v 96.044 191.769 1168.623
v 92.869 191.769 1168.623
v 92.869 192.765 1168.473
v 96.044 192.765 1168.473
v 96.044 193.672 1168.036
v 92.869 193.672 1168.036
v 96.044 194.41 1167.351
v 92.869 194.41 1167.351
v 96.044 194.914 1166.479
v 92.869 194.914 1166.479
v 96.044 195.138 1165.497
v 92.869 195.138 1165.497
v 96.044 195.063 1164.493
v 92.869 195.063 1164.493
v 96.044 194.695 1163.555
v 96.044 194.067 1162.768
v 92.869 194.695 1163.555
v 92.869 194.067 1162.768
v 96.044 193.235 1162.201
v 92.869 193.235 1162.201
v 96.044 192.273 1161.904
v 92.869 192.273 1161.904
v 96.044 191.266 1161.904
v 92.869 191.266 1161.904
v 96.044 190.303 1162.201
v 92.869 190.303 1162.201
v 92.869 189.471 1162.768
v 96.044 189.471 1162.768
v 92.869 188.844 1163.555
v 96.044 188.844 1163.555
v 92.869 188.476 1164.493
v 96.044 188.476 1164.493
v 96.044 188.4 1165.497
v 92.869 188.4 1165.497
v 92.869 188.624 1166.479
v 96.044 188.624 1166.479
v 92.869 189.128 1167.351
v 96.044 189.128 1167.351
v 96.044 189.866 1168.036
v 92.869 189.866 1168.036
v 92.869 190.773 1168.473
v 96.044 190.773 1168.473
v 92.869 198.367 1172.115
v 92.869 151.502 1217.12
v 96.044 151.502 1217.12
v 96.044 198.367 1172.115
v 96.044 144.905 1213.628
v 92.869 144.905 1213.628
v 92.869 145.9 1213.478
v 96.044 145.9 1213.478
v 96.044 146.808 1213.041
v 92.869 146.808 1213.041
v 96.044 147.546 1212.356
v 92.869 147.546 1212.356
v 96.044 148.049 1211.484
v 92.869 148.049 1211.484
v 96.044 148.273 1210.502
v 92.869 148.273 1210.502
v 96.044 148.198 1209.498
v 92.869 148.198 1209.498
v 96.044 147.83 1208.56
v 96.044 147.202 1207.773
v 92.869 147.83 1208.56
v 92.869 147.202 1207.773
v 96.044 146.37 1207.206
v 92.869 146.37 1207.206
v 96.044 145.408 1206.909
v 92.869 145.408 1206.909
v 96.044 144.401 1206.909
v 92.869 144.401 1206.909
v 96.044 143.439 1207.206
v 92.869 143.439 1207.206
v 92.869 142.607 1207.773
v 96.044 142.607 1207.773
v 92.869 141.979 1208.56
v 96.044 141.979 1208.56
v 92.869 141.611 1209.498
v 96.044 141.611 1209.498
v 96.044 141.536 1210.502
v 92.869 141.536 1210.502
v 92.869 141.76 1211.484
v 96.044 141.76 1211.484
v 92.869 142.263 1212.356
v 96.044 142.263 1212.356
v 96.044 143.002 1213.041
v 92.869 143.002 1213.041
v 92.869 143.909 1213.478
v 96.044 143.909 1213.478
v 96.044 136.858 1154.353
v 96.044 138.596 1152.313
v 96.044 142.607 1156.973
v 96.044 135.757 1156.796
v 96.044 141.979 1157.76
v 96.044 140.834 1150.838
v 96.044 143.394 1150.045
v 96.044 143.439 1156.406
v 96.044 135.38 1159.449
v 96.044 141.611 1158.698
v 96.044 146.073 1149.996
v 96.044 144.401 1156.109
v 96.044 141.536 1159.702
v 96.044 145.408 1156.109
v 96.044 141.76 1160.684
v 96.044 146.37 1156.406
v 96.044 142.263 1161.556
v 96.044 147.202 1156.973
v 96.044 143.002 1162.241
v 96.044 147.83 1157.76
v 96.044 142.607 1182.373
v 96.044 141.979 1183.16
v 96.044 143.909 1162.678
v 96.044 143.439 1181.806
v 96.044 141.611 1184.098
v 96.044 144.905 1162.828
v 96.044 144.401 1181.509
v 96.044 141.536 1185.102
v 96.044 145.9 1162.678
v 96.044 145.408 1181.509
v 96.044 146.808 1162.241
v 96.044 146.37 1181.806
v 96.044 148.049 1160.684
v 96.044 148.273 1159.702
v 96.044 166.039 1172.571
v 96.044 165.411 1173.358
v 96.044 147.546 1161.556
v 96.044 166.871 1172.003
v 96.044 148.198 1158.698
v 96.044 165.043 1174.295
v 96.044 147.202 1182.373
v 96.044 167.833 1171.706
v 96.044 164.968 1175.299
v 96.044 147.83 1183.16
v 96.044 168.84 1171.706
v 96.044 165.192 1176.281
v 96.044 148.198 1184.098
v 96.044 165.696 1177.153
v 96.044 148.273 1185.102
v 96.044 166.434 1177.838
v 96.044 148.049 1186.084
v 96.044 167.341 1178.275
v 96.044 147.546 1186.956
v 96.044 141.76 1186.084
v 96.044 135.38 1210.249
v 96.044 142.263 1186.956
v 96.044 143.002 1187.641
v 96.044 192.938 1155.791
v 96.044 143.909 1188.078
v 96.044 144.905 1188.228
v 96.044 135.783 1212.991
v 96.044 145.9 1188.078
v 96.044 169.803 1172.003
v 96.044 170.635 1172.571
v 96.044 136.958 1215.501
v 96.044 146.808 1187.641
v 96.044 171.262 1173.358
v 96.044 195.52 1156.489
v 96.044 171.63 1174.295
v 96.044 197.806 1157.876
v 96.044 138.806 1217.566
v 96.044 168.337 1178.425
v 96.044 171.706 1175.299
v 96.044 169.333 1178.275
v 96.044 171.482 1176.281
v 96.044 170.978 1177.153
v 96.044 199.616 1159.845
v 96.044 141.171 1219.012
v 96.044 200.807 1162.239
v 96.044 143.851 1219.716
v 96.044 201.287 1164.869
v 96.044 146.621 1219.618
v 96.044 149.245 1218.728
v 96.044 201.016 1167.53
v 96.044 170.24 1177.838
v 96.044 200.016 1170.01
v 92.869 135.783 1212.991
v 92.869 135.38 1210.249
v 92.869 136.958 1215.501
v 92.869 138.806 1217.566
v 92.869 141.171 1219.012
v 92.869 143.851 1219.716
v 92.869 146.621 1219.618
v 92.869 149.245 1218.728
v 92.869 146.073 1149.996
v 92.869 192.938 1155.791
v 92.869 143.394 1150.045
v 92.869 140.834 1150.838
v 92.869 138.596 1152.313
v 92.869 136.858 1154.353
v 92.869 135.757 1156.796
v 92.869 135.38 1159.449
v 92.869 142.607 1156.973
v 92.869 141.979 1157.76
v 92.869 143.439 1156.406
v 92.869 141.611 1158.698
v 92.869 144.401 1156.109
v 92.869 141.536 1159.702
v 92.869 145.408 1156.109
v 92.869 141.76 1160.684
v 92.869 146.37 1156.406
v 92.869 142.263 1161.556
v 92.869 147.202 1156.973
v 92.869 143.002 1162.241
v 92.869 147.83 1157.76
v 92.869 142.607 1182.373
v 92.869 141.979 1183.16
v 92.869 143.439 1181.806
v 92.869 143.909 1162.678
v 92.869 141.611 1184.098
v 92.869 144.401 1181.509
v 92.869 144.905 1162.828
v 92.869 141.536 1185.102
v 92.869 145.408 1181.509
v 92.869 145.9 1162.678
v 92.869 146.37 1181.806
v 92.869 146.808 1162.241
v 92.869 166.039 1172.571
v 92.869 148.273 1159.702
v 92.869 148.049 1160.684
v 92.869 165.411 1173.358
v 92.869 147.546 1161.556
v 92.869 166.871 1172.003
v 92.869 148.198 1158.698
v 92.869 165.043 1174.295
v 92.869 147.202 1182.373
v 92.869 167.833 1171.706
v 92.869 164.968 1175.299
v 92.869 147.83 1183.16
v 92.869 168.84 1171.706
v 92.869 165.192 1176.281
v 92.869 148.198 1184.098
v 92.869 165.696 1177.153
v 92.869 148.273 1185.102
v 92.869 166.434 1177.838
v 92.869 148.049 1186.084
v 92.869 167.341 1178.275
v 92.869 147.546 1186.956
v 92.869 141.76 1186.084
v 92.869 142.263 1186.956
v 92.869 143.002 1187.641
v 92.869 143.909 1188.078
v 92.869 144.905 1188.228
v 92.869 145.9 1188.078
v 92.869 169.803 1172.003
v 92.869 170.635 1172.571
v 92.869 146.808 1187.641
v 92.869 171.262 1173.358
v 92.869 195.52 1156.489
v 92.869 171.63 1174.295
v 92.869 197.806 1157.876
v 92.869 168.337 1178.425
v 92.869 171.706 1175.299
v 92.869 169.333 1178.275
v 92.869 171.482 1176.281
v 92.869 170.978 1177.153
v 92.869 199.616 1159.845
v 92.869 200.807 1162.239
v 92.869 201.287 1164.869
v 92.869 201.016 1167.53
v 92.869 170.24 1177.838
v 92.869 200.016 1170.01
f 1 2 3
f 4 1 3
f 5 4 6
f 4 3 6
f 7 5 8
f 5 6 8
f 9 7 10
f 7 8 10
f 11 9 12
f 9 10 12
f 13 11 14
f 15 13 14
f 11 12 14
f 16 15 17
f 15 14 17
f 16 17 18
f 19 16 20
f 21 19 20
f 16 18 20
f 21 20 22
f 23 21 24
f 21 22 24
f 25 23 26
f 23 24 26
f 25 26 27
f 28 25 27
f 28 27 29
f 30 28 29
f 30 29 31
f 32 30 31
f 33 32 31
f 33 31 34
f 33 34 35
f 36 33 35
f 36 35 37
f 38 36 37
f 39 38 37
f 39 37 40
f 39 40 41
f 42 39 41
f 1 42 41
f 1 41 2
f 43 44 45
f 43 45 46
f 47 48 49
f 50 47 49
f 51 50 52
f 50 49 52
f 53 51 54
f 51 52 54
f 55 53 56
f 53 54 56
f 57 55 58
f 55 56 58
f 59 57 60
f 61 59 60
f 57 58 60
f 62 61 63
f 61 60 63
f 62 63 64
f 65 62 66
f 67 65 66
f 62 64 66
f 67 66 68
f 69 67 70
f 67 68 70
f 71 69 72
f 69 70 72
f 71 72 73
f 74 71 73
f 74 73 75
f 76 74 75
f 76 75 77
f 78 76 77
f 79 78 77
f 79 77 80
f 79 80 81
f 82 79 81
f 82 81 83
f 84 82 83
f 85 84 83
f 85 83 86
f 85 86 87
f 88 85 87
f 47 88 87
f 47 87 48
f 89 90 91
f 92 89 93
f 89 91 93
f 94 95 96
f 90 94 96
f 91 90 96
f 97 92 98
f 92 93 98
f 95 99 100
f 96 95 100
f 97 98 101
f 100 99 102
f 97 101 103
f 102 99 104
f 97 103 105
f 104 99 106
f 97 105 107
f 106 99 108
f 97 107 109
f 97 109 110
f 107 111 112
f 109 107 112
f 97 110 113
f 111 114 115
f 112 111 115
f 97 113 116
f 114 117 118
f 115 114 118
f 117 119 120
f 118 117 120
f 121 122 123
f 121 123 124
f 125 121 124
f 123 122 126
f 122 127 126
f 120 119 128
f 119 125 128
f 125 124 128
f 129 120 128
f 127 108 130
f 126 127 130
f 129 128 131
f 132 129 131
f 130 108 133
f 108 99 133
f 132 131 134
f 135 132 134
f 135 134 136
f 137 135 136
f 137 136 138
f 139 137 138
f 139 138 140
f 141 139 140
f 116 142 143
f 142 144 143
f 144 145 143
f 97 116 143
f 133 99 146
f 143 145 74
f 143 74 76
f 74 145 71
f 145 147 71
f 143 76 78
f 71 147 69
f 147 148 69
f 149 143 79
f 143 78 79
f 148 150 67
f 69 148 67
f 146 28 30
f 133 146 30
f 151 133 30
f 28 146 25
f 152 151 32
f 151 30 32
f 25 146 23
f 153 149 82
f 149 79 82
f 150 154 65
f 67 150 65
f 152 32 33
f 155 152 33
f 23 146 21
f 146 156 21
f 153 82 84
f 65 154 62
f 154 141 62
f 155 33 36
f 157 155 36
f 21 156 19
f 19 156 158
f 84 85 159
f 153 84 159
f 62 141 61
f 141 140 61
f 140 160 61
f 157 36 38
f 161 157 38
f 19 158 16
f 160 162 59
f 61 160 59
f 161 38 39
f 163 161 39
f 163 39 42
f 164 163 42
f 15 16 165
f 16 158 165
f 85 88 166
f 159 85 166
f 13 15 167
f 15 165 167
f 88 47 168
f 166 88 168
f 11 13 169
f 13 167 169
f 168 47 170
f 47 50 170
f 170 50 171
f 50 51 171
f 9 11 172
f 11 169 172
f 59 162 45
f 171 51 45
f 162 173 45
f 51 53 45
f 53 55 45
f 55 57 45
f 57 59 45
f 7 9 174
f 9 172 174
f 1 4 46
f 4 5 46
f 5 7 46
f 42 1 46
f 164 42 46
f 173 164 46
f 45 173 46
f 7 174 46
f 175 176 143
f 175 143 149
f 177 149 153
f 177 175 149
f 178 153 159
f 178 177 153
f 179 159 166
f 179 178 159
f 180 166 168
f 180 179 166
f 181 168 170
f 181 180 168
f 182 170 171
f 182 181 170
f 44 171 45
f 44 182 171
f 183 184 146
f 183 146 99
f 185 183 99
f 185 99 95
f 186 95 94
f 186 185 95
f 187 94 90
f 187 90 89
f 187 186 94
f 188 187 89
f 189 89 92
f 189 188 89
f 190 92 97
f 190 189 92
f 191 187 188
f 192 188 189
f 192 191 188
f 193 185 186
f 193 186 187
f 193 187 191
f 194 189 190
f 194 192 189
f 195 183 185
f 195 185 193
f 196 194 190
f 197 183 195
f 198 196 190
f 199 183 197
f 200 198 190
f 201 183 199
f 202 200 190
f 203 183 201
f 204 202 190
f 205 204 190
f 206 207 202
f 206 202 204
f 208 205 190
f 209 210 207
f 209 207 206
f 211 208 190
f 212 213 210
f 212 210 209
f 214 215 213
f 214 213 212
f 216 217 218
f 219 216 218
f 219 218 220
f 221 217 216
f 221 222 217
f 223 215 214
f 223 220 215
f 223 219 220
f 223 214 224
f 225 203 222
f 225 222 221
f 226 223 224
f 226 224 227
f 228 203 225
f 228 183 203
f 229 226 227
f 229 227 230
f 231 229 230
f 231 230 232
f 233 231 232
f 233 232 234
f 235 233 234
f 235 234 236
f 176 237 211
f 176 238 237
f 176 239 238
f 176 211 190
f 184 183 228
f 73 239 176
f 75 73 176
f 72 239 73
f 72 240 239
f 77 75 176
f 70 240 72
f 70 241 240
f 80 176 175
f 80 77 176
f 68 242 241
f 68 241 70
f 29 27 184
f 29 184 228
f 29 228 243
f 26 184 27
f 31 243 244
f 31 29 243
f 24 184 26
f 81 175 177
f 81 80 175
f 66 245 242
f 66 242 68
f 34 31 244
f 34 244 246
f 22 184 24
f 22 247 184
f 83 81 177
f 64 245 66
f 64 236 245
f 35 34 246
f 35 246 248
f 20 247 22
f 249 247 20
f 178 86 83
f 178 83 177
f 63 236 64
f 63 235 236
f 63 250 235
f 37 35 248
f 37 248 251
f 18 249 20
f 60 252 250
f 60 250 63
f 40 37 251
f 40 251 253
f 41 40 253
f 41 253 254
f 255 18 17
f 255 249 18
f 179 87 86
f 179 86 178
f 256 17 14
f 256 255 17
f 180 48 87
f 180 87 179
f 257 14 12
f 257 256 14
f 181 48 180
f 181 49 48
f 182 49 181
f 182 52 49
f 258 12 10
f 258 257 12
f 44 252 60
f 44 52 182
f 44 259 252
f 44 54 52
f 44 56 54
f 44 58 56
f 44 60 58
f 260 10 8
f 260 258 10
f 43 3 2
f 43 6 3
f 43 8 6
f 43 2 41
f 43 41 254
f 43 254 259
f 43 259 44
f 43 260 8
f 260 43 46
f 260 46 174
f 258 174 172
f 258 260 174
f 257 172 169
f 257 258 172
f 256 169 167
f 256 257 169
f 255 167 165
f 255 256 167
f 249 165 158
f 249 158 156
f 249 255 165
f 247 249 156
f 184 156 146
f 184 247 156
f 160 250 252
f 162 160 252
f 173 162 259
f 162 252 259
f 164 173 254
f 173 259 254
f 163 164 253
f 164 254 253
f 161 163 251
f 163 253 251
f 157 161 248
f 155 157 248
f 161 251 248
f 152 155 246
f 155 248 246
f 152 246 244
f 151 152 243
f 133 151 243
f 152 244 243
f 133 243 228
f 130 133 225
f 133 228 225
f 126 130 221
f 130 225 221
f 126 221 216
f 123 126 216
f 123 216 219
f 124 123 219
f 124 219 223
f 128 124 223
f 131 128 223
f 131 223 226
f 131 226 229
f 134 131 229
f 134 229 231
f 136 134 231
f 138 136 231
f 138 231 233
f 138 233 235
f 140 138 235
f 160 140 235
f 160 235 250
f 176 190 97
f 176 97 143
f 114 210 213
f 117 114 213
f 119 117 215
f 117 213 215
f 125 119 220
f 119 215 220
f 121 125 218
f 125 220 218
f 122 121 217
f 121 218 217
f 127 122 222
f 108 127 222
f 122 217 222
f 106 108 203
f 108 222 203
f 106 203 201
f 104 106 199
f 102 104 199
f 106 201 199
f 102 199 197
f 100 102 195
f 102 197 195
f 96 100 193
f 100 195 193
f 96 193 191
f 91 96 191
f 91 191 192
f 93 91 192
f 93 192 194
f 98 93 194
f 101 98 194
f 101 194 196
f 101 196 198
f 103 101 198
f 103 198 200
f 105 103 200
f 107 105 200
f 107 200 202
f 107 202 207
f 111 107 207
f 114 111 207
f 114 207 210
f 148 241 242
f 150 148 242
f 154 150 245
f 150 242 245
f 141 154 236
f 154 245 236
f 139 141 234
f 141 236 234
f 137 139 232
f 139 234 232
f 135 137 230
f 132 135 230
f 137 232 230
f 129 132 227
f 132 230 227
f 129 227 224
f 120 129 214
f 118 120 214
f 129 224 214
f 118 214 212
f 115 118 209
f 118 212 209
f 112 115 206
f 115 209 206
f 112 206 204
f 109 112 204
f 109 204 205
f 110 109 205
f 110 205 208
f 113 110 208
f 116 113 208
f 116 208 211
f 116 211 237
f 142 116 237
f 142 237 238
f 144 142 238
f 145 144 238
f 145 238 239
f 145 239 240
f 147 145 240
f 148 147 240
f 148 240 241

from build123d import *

# Parameters (mm, degrees)
BOSS_EXTRUDE1_START     = 92.868812
BOSS_EXTRUDE1_DEPTH     = 3.175
F_1_4_CLEARANCE_HOLE1_D = 6.7564


with BuildPart() as part:
    # Sketch1 → Boss-Extrude1 (new body)
    with BuildSketch(Plane(origin=(0, 0, 0), x_dir=(0, 0, -1), z_dir=(1, 0, 0)).offset(BOSS_EXTRUDE1_START)):
        with BuildLine():
            Line((-1155.791403712, 192.93801872), (-1149.996384364, 146.073482729))
            ThreePointArc((-1149.996384364, 146.073482729), (-1152.312880663, 138.596176396), (-1159.44938805, 135.379574554))
            Line((-1159.44938805, 135.379574554), (-1210.24938805, 135.379574554))
            ThreePointArc((-1210.24938805, 135.379574554), (-1219.012005401, 141.170654074), (-1217.119501727, 151.502086438))
            Line((-1217.119501727, 151.502086438), (-1172.114521075, 198.366622429))
            ThreePointArc((-1172.114521075, 198.366622429), (-1162.238535685, 200.807382517), (-1155.791403712, 192.93801872))
        make_face()
    extrude(amount=BOSS_EXTRUDE1_DEPTH)

    # 1/4 Clearance Hole1 (through all)
    with Locations(Plane(origin=(96.043812484, 0, 0), x_dir=(0, 0, -1), z_dir=(1, 0, 0))):
        with Locations((-1175.046897724, 168.336842549), (-1165.244407398, 191.769110545), (-1210.24938805, 144.904574554), (-1184.84938805, 144.904574554), (-1159.44938805, 144.904574554)):
            Hole(F_1_4_CLEARANCE_HOLE1_D / 2)


solid = part.part
